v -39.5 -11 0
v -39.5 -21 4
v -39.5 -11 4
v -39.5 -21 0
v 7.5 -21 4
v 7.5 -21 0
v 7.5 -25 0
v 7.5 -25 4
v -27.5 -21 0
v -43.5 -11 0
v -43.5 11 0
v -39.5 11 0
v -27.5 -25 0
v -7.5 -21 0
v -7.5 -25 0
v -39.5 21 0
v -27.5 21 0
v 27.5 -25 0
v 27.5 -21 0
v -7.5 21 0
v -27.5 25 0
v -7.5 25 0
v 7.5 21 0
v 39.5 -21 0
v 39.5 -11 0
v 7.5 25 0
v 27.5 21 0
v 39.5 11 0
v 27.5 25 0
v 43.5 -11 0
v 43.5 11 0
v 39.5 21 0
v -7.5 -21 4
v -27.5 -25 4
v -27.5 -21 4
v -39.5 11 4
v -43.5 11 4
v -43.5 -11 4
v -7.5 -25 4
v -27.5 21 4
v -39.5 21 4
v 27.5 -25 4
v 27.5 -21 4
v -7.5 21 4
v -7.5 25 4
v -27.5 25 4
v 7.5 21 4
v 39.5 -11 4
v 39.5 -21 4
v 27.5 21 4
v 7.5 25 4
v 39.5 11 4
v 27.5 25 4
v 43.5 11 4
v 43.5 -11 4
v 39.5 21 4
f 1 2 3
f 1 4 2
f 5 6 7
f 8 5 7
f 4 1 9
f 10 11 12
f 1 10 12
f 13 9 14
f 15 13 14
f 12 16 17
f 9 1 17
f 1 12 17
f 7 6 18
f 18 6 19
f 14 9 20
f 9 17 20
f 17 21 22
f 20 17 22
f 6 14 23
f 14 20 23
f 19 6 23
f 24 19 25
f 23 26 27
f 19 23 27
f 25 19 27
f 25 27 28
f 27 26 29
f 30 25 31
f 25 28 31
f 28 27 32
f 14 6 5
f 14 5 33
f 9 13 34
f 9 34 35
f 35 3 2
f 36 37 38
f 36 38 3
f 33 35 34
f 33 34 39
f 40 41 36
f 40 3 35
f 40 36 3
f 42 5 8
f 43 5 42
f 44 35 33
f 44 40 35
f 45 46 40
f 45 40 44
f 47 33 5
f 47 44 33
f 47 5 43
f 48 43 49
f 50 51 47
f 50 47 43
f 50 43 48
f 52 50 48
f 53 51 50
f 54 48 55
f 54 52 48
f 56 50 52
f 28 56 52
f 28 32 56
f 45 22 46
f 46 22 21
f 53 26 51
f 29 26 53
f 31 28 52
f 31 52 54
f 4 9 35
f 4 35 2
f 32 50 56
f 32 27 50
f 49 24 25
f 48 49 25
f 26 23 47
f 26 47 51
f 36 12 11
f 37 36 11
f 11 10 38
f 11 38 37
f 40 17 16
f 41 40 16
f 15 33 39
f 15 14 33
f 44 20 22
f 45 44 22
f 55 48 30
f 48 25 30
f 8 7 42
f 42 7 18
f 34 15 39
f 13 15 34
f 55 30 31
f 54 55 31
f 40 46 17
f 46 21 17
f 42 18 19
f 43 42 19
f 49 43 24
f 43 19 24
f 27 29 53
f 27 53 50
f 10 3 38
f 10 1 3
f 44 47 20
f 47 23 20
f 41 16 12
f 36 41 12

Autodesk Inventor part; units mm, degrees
ref_plane "YZ Plane" through (0, 0, 0) normal (1, 0, 0) x (0, 1, 0)
ref_plane "XZ Plane" through (0, 0, 0) normal (0, 1, 0) x (-1, 0, 0)
ref_plane "XY Plane" through (0, 0, 0) normal (0, 0, 1) x (1, 0, 0)
sketch "Эскиз1" plane through (0, 0, 0) normal (0, 0, 1) x (1, 0, 0)
  line L0 (0, -21) -> (-7.5, -21)
  line L1 (-7.5, -21) -> (-7.5, -25)
  line L2 (-7.5, -25) -> (-27.5, -25)
  line L3 (-27.5, -25) -> (-27.5, -21)
  line L4 (-27.5, -21) -> (-39.5, -21)
  line L5 (-39.5, -21) -> (-39.5, -11)
  line L6 (-39.5, -11) -> (-43.5, -11)
  line L7 (-43.5, -11) -> (-43.5, 0)
  line L8 (-43.5, 0) -> (0, 0)
  line L9 (0, 21) -> (-7.5, 21)
  line L10 (-7.5, 21) -> (-7.5, 25)
  line L11 (-7.5, 25) -> (-27.5, 25)
  line L12 (-27.5, 25) -> (-27.5, 21)
  line L13 (-27.5, 21) -> (-39.5, 21)
  line L14 (-39.5, 21) -> (-39.5, 11)
  line L15 (-39.5, 11) -> (-43.5, 11)
  line L16 (-43.5, 11) -> (-43.5, 0)
  line L17 (0, -21) -> (0, 21)
  line L18 (0, -21) -> (7.5, -21)
  line L19 (7.5, -21) -> (7.5, -25)
  line L20 (7.5, -25) -> (27.5, -25)
  line L21 (27.5, -25) -> (27.5, -21)
  line L22 (27.5, -21) -> (39.5, -21)
  line L23 (39.5, -21) -> (39.5, -11)
  line L24 (39.5, -11) -> (43.5, -11)
  line L25 (43.5, -11) -> (43.5, 0)
  line L26 (43.5, 0) -> (0, 0)
  line L27 (0, 21) -> (7.5, 21)
  line L28 (7.5, 21) -> (7.5, 25)
  line L29 (7.5, 25) -> (27.5, 25)
  line L30 (27.5, 25) -> (27.5, 21)
  line L31 (27.5, 21) -> (39.5, 21)
  line L32 (39.5, 21) -> (39.5, 11)
  line L33 (39.5, 11) -> (43.5, 11)
  line L34 (43.5, 11) -> (43.5, 0)
  dimension "d1" = 20
  dimension "d3" = 12
  dimension "d4" = 22
  dimension "d5" = 4
  dimension "d6" = 10
  dimension "d7" = 15
extrude "Выдавливание1" add sketch "Эскиз1" along normal blind 4
properties part number "batMain" material "Дерево (береза)"
